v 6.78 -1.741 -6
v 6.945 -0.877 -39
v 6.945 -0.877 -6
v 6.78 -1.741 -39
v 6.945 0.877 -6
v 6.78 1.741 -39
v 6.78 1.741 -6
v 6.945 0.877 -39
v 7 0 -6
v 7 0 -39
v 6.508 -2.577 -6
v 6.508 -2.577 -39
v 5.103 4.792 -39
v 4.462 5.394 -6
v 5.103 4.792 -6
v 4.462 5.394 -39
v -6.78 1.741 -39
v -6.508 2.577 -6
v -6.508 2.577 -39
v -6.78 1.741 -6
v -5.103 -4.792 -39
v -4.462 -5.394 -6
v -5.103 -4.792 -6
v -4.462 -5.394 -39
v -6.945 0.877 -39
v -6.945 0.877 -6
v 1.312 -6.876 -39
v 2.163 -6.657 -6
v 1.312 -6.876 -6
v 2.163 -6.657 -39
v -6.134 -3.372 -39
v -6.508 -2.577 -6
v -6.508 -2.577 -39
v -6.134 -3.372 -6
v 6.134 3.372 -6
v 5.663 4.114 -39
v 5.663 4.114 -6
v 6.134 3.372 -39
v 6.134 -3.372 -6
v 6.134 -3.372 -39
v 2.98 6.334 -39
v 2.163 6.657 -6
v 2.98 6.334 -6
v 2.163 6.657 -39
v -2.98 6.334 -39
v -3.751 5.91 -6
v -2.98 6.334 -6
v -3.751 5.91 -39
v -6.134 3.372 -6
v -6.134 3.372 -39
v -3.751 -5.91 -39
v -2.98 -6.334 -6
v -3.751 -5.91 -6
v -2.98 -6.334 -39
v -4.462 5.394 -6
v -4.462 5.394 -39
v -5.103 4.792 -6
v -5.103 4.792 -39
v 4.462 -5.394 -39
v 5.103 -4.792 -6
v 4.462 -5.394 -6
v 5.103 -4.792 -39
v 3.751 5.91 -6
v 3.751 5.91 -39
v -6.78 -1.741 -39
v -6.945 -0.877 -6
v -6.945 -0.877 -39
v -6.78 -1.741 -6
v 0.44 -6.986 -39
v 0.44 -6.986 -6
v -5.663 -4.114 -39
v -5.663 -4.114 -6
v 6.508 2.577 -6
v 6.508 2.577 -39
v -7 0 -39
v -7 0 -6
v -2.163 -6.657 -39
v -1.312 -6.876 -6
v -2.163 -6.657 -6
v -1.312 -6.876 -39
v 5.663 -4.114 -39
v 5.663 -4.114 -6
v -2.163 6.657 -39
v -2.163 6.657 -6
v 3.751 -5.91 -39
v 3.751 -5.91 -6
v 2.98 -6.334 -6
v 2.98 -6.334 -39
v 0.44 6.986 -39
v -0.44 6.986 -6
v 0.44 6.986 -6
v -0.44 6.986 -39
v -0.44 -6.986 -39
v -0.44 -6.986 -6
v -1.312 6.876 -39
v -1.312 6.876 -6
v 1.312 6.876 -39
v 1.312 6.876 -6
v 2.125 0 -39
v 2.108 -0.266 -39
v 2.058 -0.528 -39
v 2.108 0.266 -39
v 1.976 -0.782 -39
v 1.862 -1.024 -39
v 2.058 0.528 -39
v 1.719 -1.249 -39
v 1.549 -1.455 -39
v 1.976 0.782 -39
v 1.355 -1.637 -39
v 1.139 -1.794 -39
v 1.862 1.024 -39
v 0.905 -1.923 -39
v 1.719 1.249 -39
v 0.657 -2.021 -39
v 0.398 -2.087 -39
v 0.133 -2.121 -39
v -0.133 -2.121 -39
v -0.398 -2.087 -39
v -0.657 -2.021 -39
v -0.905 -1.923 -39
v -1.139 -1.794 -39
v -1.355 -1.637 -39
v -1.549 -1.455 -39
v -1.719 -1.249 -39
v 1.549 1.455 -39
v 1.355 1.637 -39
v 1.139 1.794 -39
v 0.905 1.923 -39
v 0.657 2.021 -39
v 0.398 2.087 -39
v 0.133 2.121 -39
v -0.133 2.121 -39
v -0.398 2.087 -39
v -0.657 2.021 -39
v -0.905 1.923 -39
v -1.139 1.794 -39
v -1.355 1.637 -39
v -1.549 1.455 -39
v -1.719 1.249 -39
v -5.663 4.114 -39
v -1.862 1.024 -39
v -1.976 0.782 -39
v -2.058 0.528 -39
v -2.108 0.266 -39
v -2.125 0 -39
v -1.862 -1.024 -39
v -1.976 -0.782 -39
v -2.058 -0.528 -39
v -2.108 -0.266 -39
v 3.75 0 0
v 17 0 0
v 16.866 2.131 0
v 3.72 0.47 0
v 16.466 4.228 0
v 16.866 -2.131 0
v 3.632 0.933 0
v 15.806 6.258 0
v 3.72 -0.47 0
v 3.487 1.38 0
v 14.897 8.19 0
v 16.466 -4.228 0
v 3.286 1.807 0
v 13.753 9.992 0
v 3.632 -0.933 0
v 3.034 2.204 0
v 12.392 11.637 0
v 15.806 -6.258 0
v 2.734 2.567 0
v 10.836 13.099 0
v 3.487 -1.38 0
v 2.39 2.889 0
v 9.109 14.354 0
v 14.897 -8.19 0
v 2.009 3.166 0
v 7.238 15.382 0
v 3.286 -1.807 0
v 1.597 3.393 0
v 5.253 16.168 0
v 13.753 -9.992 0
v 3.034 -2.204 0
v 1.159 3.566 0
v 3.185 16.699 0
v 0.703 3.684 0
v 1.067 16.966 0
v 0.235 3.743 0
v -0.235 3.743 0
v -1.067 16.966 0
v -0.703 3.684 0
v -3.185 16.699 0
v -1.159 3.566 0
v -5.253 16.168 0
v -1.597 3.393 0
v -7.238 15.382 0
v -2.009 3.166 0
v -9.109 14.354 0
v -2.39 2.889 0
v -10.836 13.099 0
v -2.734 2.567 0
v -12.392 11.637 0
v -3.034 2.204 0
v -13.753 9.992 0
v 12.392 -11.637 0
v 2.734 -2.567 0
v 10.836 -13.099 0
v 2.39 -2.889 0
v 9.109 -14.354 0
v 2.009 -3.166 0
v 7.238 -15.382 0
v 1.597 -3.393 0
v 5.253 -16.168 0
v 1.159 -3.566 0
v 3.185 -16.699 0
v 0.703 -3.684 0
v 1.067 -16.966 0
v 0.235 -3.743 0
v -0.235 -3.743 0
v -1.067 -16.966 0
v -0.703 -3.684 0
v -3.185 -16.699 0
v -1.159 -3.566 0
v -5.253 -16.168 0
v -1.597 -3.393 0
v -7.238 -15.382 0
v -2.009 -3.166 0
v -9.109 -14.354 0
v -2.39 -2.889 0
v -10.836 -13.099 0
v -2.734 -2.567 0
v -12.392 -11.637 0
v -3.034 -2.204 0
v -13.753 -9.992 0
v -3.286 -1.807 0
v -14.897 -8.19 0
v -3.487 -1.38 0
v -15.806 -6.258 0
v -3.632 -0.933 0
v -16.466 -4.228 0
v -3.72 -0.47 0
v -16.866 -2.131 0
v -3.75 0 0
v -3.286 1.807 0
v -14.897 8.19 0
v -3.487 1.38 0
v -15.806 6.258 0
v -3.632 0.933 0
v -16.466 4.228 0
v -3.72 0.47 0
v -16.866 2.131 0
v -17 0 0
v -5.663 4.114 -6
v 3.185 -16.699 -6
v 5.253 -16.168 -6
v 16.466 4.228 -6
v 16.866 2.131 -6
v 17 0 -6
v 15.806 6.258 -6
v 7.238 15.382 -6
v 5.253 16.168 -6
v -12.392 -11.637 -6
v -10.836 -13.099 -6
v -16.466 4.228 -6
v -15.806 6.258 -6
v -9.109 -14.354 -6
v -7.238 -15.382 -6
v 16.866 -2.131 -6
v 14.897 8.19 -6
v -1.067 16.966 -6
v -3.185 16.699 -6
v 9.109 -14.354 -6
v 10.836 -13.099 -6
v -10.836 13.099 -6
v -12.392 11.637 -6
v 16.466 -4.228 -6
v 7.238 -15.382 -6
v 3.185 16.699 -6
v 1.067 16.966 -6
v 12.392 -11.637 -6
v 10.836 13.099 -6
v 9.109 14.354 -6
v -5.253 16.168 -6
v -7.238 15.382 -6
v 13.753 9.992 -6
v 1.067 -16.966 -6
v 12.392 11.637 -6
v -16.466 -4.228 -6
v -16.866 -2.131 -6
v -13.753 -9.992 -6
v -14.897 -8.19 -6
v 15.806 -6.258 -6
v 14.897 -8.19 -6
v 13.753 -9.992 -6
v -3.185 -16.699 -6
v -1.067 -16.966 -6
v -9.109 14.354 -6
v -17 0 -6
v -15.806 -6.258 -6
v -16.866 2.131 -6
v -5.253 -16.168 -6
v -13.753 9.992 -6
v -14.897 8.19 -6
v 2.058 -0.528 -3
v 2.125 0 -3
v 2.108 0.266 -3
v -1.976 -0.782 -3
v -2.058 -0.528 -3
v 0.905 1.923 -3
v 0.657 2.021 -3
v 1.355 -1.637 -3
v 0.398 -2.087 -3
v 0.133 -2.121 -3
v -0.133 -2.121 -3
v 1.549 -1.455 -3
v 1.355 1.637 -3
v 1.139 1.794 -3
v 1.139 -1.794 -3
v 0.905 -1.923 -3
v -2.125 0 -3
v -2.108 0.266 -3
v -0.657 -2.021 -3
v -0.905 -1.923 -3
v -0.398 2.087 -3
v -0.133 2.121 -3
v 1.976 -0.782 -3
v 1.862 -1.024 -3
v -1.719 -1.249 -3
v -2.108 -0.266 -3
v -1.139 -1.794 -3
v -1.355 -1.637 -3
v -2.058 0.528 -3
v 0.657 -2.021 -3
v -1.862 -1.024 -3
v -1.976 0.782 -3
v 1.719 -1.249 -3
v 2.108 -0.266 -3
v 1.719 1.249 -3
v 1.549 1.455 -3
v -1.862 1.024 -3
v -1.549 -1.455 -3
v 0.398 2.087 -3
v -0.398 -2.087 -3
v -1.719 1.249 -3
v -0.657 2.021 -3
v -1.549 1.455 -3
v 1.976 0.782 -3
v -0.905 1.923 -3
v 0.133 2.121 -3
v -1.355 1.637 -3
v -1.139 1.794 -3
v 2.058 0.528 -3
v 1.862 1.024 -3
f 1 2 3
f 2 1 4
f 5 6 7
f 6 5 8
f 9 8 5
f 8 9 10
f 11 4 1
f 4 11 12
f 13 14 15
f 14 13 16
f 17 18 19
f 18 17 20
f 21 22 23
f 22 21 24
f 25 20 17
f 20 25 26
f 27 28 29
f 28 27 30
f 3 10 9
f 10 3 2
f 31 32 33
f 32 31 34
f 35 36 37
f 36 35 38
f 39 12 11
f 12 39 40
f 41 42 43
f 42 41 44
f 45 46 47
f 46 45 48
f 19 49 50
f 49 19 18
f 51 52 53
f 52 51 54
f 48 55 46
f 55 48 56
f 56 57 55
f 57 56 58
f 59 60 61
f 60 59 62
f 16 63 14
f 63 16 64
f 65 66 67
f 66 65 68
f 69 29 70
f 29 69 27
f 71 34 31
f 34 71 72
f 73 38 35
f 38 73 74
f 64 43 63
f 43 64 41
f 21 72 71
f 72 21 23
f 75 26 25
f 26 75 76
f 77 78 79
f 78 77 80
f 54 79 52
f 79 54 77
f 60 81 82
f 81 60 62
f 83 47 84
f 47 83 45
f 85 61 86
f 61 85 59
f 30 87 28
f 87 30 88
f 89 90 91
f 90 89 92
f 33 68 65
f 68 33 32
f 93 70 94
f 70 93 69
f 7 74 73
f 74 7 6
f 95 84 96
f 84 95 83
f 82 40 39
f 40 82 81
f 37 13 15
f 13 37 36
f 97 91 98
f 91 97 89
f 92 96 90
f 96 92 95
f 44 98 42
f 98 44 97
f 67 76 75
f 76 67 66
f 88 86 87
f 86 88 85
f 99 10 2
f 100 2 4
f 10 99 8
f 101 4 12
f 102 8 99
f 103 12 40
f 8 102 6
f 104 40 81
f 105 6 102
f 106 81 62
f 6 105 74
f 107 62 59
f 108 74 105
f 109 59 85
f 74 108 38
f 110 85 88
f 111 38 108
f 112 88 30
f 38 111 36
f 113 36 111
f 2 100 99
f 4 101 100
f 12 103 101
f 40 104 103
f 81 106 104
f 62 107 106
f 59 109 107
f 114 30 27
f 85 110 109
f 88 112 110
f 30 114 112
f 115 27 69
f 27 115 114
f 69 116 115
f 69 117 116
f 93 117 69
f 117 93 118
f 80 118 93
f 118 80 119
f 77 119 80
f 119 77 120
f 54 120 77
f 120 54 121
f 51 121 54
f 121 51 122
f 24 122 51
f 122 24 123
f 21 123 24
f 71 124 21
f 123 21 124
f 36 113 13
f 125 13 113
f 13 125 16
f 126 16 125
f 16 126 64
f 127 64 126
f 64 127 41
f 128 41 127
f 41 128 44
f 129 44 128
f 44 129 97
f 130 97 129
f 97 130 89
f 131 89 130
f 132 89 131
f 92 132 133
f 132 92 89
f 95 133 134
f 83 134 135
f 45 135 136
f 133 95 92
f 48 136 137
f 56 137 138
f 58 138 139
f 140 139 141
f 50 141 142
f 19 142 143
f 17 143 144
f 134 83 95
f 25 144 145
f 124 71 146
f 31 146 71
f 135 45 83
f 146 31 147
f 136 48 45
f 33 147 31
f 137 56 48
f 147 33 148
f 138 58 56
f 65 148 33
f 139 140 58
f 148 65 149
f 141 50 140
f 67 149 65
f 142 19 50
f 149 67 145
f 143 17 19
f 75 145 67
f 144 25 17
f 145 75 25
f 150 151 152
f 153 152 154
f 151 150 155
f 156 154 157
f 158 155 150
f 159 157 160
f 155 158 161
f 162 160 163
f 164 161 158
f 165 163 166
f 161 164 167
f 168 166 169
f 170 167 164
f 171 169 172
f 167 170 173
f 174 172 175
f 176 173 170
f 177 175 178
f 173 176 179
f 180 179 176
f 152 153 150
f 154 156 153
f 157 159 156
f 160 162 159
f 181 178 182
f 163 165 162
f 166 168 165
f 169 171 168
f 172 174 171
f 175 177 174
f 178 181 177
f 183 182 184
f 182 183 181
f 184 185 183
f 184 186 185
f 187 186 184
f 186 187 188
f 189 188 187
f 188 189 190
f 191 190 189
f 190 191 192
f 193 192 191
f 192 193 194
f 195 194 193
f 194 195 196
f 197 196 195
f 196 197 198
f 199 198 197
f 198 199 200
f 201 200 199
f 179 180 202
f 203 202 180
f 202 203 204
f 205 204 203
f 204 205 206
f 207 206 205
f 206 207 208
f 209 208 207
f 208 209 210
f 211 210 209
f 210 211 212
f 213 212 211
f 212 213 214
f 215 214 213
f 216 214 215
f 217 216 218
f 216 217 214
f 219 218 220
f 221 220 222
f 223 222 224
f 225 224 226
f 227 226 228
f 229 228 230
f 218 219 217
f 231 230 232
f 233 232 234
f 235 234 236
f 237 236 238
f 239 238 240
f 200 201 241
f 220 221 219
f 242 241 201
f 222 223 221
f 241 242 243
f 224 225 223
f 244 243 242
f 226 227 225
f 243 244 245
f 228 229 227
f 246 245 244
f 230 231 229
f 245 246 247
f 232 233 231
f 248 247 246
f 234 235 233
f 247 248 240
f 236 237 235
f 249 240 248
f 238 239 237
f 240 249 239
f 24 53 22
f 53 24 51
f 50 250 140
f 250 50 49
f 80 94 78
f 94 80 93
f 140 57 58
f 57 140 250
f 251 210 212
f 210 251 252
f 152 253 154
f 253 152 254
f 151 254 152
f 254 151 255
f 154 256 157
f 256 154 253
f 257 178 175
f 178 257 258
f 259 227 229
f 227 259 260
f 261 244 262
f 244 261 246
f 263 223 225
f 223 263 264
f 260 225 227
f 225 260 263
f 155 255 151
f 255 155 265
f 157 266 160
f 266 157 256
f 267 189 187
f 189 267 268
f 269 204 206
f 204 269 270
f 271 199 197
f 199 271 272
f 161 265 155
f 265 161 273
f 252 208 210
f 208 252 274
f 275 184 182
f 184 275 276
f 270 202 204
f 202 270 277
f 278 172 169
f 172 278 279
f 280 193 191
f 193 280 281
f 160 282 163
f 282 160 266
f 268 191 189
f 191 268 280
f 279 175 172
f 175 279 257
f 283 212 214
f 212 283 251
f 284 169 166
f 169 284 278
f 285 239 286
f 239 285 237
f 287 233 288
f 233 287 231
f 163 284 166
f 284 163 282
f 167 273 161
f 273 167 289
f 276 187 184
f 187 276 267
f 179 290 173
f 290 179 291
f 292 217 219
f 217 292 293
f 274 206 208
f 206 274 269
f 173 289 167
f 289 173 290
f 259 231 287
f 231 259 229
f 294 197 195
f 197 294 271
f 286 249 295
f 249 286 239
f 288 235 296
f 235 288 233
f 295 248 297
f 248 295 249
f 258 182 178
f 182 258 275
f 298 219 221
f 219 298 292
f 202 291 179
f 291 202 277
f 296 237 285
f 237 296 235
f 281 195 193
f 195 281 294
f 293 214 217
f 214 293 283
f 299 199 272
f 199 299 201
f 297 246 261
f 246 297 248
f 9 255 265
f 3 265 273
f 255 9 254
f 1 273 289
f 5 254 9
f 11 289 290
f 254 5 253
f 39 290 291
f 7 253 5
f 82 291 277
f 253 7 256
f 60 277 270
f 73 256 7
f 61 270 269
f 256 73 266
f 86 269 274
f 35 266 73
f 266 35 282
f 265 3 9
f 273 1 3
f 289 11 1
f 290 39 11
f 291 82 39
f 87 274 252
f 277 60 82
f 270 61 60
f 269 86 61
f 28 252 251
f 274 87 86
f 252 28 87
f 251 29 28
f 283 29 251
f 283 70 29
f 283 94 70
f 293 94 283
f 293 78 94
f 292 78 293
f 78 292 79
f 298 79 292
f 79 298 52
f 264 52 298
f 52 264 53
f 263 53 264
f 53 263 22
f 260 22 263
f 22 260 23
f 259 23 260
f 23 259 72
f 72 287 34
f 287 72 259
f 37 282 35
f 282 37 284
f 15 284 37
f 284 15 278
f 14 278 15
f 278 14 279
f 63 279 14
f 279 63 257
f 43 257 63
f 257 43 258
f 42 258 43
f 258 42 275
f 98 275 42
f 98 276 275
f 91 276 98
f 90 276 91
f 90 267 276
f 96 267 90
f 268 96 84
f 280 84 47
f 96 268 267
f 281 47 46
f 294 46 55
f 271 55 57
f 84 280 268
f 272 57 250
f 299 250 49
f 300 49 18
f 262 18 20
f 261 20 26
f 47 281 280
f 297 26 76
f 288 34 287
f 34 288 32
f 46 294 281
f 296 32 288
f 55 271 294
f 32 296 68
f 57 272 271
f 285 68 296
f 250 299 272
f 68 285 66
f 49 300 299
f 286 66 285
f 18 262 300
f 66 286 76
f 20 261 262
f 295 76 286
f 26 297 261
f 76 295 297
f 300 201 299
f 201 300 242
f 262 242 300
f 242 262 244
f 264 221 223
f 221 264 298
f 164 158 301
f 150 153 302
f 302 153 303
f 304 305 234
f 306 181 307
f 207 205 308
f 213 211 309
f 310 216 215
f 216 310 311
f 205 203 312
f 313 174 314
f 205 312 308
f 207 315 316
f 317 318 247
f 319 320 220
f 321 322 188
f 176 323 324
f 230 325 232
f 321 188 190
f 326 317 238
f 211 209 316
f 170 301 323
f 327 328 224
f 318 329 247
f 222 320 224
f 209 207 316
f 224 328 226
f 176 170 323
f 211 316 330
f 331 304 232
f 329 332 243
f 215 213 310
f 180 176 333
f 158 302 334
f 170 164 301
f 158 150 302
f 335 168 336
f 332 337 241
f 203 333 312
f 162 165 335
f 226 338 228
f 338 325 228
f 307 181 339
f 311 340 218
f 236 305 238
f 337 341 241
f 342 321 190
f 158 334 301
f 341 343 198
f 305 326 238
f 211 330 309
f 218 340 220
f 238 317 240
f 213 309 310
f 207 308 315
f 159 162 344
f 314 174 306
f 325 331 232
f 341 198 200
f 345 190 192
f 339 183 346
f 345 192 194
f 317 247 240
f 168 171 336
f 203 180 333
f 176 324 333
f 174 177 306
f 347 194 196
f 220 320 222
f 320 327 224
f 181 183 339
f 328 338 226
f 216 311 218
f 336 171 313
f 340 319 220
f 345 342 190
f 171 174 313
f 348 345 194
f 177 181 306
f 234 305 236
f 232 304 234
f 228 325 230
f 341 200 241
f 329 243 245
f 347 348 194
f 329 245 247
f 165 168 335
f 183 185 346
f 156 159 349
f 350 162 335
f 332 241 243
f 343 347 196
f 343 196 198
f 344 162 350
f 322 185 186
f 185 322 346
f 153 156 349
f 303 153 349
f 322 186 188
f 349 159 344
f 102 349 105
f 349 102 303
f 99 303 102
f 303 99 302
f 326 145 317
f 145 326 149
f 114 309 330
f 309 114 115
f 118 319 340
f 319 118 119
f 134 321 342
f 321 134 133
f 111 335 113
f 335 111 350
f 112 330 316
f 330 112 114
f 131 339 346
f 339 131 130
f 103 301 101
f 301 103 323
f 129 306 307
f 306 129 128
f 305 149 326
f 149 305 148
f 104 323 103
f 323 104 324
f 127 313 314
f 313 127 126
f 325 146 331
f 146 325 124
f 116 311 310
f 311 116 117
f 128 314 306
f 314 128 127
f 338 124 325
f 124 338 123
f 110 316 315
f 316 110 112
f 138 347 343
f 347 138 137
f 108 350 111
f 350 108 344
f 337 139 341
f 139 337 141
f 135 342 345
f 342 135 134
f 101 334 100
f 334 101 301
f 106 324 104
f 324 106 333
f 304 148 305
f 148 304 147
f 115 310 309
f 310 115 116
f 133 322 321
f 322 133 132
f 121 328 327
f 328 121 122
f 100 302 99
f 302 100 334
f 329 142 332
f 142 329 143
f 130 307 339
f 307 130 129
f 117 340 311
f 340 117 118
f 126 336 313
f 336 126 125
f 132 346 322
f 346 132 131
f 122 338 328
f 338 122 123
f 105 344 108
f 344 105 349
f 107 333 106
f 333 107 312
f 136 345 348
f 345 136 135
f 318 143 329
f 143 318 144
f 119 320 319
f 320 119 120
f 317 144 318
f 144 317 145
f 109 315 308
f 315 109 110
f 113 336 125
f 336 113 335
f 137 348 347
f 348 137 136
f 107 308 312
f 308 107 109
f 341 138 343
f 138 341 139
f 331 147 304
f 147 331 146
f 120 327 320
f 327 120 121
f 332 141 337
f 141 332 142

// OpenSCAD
$fn = 50;


difference() {
	union() {
		translate(v = [0, 0, -39.0000000000]) {
			cylinder(h = 39, r = 7.0000000000);
		}
		translate(v = [0, 0, -6.0000000000]) {
			cylinder(h = 6, r = 17.0000000000);
		}
	}
	union() {
		translate(v = [0, 0, 0]) {
			rotate(a = [0, 0, 0]) {
				difference() {
					union() {
						#translate(v = [0, 0, -39.0000000000]) {
							cylinder(h = 39, r = 2.0000000000);
						}
						#translate(v = [0, 0, -3]) {
							cylinder(h = 3, r = 7.0000000000, r1 = 2.1250000000, r2 = 3.7500000000);
						}
						#translate(v = [0, 0, -39.0000000000]) {
							cylinder(h = 39, r = 2.1250000000);
						}
						#translate(v = [0, 0, -39.0000000000]) {
							cylinder(h = 39, r = 2.0000000000);
						}
					}
					union();
				}
			}
		}
	}
}
